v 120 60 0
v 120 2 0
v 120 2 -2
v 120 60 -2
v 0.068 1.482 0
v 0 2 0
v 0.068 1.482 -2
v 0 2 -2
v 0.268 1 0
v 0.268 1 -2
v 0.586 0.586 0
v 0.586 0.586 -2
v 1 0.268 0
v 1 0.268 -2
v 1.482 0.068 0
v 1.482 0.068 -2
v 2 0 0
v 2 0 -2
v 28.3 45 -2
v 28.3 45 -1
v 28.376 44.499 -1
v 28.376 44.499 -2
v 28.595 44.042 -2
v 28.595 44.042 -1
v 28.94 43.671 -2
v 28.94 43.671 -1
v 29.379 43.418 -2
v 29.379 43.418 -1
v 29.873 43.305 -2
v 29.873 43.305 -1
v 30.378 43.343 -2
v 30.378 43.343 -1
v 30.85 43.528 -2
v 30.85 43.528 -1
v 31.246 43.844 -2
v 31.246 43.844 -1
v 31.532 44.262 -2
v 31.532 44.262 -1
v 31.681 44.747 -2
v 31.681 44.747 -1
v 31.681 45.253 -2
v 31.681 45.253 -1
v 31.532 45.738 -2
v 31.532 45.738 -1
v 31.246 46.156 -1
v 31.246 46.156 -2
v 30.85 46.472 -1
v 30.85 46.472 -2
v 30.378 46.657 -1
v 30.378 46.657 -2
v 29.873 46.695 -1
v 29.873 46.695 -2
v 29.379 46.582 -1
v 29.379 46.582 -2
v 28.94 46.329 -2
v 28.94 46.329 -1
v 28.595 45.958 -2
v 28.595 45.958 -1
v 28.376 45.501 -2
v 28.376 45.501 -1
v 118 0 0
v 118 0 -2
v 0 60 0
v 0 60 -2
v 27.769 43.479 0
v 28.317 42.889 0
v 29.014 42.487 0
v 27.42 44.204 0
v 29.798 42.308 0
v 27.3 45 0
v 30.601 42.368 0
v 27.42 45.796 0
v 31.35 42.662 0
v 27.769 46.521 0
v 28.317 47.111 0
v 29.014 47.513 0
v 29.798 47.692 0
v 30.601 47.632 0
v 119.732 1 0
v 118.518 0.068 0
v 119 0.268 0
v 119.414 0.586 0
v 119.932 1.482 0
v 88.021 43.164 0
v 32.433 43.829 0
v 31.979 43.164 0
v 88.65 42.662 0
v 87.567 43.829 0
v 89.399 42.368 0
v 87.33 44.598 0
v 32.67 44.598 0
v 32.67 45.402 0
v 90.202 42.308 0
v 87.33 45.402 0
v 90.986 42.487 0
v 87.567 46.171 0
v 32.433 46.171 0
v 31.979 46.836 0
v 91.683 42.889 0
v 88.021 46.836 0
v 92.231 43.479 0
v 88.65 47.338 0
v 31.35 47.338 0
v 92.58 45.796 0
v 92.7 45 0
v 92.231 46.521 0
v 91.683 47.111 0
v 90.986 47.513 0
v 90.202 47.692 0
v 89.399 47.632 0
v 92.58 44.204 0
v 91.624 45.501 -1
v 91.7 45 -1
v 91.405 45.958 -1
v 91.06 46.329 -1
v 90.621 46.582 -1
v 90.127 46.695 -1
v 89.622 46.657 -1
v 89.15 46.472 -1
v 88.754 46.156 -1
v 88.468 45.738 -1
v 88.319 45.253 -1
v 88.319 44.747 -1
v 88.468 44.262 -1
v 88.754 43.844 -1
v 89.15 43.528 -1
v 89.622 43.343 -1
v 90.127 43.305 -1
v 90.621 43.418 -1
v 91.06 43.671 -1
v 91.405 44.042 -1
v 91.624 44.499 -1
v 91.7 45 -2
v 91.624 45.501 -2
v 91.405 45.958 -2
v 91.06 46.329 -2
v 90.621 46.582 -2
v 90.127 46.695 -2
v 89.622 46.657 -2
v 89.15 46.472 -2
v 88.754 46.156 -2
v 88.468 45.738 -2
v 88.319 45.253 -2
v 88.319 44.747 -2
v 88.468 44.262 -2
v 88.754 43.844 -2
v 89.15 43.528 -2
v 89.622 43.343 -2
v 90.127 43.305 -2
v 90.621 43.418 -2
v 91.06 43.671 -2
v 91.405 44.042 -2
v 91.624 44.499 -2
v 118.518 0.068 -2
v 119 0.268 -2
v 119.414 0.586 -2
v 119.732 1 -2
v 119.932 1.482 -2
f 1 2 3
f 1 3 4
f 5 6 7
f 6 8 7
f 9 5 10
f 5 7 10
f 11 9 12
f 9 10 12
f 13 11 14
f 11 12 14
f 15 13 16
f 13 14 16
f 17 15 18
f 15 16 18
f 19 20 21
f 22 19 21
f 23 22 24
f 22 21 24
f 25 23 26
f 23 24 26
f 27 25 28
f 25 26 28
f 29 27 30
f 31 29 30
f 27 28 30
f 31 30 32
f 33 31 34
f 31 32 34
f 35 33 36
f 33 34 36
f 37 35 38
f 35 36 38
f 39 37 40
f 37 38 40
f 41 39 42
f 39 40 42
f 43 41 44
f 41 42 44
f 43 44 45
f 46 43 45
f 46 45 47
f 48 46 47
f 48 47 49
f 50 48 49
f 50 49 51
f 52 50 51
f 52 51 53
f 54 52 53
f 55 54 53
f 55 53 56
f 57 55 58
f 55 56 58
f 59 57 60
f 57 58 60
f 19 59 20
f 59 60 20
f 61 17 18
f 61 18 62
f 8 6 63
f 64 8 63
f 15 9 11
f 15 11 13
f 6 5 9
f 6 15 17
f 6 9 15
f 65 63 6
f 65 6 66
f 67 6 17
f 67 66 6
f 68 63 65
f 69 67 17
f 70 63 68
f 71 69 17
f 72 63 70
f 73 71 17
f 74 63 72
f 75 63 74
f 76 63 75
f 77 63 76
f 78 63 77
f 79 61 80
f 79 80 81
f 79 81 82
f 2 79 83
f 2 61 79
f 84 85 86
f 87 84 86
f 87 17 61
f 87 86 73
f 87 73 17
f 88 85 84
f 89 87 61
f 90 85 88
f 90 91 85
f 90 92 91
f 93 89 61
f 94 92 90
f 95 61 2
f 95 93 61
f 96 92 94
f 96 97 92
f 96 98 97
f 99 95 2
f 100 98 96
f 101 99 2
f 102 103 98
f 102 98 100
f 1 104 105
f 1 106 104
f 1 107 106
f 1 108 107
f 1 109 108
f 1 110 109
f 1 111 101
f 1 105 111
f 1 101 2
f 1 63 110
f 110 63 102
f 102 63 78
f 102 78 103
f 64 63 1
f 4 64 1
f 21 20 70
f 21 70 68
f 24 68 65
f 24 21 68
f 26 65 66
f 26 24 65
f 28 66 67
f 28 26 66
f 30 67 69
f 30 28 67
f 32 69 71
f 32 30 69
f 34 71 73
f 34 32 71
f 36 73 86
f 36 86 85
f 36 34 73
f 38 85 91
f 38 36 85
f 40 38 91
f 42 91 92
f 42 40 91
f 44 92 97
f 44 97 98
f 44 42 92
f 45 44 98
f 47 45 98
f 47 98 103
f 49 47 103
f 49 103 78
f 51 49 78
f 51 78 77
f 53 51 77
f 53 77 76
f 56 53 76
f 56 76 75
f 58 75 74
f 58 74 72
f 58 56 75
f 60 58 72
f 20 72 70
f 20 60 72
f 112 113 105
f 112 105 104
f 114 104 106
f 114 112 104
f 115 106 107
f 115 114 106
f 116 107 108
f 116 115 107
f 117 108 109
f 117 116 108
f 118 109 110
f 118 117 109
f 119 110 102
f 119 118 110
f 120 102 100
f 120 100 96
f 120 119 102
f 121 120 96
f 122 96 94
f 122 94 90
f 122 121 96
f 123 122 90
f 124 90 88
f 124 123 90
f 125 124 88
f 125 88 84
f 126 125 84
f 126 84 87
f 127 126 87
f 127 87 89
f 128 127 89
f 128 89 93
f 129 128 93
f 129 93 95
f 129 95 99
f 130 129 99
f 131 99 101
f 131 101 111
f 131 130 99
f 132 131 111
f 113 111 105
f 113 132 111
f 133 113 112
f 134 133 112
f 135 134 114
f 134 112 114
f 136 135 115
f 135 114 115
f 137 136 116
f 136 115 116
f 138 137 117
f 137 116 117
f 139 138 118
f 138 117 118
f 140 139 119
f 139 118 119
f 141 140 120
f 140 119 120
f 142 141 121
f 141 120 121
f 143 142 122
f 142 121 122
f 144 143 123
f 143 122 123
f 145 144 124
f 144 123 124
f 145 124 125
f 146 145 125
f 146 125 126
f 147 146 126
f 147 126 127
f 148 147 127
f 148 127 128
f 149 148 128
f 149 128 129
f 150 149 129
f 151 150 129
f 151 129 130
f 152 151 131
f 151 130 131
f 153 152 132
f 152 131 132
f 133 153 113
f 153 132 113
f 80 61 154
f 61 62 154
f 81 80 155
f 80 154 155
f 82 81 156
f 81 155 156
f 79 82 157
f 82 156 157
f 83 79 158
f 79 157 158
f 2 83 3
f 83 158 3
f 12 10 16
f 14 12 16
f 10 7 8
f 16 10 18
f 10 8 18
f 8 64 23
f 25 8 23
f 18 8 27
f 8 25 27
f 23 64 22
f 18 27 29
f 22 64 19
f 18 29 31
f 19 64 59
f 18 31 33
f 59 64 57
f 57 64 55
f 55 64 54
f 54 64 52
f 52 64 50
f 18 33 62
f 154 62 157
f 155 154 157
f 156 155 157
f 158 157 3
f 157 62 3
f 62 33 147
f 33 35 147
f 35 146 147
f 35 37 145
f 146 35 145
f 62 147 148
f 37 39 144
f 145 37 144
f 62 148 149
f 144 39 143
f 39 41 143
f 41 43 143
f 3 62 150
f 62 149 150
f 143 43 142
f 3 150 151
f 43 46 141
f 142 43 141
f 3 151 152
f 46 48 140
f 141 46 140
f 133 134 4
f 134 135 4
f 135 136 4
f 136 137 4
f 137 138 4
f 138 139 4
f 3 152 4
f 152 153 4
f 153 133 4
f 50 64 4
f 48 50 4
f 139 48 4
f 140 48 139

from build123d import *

# Parameters (mm, degrees)
SCHIZZO1_W                   = 120
SCHIZZO1_H                   = 60
SCHIZZO1_R                   = 1.7
ESTRUSIONE_ESTRUSIONE2_DEPTH = 2
RACCORDO1_R                  = 2
RACCORDO2_R                  = 2
SMUSSO1_SIZE                 = 1
SMUSSO2_SIZE                 = 1


with BuildPart() as part:
    # Schizzo1 → Estrusione-Estrusione2 (new body)
    with BuildSketch(Plane.XY):
        with Locations((60, 30)):
            Rectangle(SCHIZZO1_W, SCHIZZO1_H)
        with Locations((90, 45)):
            Circle(SCHIZZO1_R, mode=Mode.SUBTRACT)
        with Locations(Location((30, 45, 0), (0, 0, 180))):
            Circle(SCHIZZO1_R, mode=Mode.SUBTRACT)
    extrude(amount=-ESTRUSIONE_ESTRUSIONE2_DEPTH)

    # Raccordo1
    raccordo1_edges = [part.edges().sort_by_distance(p)[0] for p in [
        (0, 0, -1),
    ]]
    fillet(raccordo1_edges, radius=RACCORDO1_R)

    # Raccordo2
    raccordo2_edges = [part.edges().sort_by_distance(p)[0] for p in [
        (120, 0, -1),
    ]]
    fillet(raccordo2_edges, radius=RACCORDO2_R)

    # Smusso1
    smusso1_edges = [part.edges().sort_by_distance(p)[0] for p in [
        (31.7, 45, 0),
    ]]
    chamfer(smusso1_edges, length=SMUSSO1_SIZE)

    # Smusso2
    smusso2_edges = [part.edges().sort_by_distance(p)[0] for p in [
        (88.3, 45, 0),
    ]]
    chamfer(smusso2_edges, length=SMUSSO2_SIZE)


solid = part.part
